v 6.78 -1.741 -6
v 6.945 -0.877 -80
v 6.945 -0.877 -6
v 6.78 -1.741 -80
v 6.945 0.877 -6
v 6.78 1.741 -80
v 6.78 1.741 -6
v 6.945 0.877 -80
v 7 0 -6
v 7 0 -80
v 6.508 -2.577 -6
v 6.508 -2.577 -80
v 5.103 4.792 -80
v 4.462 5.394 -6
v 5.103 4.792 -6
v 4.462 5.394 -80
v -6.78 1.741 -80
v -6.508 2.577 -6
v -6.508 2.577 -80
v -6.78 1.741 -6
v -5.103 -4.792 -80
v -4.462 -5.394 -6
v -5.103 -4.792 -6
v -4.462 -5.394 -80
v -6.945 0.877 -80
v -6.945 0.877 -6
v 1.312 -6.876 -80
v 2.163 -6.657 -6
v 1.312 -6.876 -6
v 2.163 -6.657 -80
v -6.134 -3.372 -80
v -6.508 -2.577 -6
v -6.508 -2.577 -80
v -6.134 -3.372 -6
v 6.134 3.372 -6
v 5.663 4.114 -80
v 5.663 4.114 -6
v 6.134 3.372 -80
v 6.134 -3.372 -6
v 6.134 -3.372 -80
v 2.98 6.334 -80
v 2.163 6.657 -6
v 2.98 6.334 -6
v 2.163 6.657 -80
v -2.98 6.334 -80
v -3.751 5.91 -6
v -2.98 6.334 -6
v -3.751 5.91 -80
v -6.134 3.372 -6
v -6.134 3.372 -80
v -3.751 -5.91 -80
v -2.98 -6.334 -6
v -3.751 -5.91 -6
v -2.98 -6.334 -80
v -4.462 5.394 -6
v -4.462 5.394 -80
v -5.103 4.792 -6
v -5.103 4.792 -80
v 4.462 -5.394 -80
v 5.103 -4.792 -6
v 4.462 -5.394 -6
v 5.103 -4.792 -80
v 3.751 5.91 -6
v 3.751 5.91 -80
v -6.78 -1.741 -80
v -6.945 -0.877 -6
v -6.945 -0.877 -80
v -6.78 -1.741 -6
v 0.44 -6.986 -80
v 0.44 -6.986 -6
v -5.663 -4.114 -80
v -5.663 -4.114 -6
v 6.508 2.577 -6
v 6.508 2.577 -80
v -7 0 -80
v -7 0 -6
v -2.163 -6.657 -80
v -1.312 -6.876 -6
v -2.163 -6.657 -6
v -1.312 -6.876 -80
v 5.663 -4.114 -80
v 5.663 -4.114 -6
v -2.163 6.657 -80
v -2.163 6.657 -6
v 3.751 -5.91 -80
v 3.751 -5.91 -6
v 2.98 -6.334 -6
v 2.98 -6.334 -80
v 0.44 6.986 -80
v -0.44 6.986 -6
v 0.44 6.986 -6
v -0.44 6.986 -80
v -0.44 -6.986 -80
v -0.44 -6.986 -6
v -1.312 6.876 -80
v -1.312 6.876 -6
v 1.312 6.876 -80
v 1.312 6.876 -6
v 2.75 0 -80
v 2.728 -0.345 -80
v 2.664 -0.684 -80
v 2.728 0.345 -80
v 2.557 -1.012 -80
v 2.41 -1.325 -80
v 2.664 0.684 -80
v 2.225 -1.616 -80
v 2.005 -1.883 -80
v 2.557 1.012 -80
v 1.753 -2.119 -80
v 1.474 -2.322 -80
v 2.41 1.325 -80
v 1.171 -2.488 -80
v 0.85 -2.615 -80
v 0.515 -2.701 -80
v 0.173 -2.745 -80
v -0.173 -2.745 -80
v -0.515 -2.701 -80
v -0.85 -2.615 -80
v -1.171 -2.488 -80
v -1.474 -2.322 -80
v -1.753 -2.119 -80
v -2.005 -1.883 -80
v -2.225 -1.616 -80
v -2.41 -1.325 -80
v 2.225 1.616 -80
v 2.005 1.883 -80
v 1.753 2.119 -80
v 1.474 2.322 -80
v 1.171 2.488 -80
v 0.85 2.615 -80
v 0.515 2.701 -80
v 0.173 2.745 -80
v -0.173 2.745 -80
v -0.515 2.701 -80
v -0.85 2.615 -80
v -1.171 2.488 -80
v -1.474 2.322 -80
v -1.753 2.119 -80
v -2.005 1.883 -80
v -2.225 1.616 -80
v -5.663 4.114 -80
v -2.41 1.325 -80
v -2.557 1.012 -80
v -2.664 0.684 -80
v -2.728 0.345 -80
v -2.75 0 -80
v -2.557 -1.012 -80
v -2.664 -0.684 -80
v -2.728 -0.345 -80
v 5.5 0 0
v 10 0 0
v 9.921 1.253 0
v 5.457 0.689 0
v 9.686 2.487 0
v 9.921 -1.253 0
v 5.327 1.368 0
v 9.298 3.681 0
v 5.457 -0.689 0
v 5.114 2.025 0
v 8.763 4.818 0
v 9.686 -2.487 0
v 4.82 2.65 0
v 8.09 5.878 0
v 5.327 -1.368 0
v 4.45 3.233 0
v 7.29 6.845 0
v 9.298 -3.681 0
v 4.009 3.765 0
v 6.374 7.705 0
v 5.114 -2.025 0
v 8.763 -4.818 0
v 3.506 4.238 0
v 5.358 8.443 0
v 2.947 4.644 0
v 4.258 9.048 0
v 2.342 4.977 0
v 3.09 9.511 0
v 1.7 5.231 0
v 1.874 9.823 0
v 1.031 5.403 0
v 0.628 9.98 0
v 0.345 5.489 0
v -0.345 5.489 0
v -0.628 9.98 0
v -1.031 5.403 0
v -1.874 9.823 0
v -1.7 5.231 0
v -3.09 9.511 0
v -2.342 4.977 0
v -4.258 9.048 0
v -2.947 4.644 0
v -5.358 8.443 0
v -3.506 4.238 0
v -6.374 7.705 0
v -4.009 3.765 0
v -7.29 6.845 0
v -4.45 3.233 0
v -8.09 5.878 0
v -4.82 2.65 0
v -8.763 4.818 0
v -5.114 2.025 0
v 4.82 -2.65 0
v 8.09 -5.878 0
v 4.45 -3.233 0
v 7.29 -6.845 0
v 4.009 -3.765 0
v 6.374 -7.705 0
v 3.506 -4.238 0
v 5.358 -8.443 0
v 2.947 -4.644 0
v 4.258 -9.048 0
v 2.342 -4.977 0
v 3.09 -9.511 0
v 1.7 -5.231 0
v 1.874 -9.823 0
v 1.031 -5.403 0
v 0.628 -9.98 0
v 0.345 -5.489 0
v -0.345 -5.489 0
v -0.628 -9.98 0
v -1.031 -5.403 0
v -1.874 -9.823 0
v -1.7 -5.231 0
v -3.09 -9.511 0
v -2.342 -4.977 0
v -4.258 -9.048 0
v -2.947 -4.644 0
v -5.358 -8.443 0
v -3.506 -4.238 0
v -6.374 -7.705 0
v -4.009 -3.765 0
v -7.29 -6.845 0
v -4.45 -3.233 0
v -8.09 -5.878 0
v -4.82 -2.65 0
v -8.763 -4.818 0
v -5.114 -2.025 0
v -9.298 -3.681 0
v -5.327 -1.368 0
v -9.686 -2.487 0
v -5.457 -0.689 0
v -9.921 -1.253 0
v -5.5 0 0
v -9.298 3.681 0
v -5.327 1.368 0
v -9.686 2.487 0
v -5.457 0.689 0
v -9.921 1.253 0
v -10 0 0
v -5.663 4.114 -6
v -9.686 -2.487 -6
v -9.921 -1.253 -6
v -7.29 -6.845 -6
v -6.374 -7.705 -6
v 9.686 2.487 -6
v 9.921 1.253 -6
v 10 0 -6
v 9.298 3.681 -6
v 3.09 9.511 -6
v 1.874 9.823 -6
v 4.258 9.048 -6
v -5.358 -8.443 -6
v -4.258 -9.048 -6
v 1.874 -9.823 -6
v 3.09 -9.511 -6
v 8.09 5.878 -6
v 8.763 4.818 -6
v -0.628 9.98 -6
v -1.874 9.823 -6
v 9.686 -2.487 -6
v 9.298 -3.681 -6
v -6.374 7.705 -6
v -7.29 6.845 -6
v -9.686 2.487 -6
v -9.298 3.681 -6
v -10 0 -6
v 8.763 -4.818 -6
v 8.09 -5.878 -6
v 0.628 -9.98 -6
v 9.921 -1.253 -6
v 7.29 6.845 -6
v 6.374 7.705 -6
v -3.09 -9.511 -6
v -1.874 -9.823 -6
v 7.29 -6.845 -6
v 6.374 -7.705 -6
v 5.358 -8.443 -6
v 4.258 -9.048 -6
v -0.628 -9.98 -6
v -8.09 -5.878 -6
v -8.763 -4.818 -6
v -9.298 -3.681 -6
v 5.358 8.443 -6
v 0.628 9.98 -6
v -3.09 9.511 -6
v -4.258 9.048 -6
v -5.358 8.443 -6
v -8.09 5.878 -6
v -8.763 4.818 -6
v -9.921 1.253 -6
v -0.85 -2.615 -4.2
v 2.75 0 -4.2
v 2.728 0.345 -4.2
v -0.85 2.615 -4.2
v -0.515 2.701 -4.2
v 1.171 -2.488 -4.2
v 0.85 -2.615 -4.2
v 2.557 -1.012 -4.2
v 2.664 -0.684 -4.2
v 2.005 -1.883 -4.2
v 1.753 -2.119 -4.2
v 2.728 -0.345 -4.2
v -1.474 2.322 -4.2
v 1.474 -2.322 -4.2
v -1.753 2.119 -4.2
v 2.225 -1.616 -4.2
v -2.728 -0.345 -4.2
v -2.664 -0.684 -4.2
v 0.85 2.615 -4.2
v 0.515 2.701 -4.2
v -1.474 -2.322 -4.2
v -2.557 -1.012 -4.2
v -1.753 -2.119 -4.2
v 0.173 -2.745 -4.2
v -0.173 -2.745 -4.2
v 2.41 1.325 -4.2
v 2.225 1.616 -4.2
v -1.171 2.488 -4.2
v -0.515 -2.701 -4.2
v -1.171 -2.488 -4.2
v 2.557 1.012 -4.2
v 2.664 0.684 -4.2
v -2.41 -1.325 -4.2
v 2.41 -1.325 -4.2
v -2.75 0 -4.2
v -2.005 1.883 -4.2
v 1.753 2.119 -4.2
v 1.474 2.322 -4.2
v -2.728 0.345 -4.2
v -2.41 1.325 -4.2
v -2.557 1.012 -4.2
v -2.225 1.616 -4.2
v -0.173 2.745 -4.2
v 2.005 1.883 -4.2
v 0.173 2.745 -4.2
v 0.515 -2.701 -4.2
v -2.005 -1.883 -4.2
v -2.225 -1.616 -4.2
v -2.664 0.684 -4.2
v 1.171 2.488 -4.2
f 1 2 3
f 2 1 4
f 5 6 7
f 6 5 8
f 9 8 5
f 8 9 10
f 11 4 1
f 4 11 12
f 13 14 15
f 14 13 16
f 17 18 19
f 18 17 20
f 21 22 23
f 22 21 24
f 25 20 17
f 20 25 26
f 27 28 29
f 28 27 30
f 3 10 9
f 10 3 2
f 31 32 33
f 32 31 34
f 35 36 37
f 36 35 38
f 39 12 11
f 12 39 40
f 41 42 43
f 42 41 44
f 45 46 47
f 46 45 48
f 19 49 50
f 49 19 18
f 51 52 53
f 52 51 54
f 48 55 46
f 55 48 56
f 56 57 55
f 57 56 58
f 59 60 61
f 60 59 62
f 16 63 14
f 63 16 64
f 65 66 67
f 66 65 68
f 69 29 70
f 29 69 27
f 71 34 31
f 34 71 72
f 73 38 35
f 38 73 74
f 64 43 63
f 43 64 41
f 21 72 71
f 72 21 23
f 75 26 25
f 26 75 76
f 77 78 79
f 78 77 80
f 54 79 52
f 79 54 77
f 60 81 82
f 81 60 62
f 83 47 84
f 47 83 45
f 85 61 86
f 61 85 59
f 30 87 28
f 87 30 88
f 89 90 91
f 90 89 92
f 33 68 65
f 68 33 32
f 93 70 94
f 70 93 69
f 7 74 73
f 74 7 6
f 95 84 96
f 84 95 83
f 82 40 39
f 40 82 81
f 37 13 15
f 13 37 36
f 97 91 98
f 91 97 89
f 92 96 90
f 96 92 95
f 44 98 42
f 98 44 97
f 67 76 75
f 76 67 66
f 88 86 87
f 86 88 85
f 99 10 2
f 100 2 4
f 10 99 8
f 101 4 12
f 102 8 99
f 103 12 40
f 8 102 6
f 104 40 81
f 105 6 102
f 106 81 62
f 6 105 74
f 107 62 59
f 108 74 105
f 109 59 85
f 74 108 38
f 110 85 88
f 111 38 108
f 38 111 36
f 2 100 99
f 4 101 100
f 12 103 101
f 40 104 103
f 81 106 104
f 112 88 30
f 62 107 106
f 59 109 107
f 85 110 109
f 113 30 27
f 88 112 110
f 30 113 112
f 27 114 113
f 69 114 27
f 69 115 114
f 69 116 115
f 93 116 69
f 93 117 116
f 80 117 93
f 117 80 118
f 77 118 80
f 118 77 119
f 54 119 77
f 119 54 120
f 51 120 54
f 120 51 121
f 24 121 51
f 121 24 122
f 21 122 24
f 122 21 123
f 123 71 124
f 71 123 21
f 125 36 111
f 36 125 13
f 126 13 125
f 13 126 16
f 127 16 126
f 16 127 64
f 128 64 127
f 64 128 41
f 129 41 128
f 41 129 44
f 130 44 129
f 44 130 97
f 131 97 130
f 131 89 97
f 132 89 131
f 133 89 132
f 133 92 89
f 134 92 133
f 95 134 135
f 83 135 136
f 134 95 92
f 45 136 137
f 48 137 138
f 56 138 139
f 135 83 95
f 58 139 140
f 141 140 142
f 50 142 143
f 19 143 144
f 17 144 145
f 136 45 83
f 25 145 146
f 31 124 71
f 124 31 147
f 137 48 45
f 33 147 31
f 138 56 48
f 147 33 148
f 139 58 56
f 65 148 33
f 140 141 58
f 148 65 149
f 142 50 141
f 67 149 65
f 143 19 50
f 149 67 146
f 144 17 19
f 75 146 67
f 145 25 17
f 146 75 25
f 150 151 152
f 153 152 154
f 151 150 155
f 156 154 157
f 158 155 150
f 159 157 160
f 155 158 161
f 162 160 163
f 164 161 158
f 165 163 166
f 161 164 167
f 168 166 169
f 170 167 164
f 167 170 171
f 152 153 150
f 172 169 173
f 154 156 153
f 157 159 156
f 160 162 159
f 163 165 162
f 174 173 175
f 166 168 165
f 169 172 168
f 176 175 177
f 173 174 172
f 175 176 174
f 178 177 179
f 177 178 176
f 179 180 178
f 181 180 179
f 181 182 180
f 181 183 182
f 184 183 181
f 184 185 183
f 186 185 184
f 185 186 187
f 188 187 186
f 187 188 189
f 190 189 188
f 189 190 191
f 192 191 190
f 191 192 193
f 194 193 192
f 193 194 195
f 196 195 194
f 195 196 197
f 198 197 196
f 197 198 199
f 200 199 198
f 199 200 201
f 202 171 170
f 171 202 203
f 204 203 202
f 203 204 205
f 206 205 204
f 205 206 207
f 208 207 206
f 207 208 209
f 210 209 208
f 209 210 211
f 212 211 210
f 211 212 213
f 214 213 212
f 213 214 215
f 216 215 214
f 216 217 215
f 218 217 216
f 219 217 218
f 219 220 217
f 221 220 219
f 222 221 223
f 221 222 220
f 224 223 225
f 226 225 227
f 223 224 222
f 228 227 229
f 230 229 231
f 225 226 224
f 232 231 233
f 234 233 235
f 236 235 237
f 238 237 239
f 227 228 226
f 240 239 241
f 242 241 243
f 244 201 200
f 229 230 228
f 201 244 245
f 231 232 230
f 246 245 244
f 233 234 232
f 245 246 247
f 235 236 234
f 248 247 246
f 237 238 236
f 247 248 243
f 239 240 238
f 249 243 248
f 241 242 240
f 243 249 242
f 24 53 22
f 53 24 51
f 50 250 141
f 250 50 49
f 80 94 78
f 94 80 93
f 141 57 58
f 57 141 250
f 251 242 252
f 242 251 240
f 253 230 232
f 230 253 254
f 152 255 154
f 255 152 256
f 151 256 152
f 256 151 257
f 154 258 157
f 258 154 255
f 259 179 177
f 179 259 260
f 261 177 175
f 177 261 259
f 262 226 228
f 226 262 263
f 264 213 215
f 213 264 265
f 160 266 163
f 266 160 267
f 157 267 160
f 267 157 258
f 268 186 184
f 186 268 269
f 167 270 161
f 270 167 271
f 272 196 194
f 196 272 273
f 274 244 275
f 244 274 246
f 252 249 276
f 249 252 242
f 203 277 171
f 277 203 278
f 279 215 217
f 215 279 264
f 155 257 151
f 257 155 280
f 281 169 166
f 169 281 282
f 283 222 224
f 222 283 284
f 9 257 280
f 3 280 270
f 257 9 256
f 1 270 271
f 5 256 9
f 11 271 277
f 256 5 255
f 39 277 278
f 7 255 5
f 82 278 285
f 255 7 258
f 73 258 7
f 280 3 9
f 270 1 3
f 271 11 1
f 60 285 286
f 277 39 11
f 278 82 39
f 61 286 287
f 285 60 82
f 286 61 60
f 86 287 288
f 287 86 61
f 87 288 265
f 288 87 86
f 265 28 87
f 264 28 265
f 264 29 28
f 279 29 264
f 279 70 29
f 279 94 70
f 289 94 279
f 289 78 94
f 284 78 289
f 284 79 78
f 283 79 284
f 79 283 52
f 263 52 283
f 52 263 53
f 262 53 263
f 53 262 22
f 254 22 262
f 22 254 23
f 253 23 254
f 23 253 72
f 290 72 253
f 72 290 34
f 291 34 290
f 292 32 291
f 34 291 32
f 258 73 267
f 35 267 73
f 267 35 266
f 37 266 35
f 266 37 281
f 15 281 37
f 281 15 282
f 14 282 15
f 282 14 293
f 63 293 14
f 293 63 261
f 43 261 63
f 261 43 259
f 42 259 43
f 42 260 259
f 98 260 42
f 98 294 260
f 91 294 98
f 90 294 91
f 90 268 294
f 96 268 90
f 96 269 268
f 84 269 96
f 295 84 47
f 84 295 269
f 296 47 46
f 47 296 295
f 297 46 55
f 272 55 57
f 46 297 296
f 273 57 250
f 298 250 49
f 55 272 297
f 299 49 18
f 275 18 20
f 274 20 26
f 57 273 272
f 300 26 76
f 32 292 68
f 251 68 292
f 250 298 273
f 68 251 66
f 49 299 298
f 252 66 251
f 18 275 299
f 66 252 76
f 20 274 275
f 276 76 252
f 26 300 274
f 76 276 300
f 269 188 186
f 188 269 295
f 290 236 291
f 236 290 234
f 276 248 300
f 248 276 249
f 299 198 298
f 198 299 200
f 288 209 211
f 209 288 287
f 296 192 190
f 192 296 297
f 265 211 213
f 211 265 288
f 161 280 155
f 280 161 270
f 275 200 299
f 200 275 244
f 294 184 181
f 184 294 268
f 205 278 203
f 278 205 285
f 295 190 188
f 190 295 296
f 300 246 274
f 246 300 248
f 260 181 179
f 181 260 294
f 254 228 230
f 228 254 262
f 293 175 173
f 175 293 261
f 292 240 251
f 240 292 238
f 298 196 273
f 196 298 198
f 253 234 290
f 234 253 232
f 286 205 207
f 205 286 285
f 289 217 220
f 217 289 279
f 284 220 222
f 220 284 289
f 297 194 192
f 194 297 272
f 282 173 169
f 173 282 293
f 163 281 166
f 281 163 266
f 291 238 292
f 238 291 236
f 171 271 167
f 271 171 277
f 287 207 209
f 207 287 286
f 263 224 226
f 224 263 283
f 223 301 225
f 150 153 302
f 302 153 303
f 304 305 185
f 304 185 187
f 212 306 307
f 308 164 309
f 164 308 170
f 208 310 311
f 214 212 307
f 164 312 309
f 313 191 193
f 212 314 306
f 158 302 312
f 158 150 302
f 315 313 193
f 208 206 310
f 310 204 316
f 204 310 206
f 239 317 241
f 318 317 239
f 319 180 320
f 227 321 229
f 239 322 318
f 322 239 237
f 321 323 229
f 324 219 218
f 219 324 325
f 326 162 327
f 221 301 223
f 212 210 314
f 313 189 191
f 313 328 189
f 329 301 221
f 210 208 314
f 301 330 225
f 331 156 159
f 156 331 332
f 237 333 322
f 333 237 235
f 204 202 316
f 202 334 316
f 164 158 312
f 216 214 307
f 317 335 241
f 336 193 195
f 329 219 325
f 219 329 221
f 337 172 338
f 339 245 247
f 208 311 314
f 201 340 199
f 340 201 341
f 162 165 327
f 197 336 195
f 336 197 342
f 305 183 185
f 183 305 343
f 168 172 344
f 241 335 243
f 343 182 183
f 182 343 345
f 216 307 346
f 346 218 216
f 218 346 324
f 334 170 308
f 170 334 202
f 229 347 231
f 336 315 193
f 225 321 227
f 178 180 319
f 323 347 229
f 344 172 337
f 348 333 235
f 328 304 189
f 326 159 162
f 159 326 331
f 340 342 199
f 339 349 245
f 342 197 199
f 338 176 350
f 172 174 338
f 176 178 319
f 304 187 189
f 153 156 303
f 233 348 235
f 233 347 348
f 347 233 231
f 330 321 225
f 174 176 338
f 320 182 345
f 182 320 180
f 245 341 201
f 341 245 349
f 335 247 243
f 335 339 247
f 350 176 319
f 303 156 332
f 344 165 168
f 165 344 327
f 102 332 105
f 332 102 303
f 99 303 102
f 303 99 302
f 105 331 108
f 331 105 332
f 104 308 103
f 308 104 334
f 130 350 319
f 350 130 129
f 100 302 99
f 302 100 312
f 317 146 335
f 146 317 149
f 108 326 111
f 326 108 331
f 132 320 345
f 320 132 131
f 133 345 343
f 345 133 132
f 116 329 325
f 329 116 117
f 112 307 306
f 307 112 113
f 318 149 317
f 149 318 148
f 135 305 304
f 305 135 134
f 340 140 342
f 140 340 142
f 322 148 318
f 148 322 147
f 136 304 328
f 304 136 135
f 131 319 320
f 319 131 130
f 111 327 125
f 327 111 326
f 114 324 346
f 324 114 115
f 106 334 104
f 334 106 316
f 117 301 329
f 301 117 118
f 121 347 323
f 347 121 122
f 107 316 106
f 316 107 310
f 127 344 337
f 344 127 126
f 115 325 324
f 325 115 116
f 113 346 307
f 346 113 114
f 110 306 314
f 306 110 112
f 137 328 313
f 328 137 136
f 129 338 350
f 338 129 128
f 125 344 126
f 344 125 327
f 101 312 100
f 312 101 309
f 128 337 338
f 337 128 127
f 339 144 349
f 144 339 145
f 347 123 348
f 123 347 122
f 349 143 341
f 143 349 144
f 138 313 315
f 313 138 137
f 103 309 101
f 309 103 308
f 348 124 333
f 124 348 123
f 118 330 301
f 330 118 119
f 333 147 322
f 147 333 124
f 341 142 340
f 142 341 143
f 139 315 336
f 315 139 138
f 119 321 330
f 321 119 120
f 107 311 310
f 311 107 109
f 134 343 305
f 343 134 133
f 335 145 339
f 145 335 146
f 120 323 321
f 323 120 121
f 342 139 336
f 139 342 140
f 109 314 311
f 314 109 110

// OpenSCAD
$fn = 50;


difference() {
	union() {
		translate(v = [0, 0, -80.0000000000]) {
			cylinder(h = 80, r = 7.0000000000);
		}
		translate(v = [0, 0, -6.0000000000]) {
			cylinder(h = 6, r = 10.0000000000);
		}
	}
	union() {
		translate(v = [0, 0, 0]) {
			rotate(a = [0, 0, 0]) {
				difference() {
					union() {
						#translate(v = [0, 0, -80.0000000000]) {
							cylinder(h = 80, r = 2.2500000000);
						}
						#translate(v = [0, 0, -4.2000000000]) {
							cylinder(h = 4.2000000000, r1 = 2.7500000000, r2 = 5.5000000000);
						}
						#translate(v = [0, 0, -80.0000000000]) {
							cylinder(h = 80, r = 2.7500000000);
						}
						#translate(v = [0, 0, -80.0000000000]) {
							cylinder(h = 80, r = 2.2500000000);
						}
					}
					union();
				}
			}
		}
	}
}
